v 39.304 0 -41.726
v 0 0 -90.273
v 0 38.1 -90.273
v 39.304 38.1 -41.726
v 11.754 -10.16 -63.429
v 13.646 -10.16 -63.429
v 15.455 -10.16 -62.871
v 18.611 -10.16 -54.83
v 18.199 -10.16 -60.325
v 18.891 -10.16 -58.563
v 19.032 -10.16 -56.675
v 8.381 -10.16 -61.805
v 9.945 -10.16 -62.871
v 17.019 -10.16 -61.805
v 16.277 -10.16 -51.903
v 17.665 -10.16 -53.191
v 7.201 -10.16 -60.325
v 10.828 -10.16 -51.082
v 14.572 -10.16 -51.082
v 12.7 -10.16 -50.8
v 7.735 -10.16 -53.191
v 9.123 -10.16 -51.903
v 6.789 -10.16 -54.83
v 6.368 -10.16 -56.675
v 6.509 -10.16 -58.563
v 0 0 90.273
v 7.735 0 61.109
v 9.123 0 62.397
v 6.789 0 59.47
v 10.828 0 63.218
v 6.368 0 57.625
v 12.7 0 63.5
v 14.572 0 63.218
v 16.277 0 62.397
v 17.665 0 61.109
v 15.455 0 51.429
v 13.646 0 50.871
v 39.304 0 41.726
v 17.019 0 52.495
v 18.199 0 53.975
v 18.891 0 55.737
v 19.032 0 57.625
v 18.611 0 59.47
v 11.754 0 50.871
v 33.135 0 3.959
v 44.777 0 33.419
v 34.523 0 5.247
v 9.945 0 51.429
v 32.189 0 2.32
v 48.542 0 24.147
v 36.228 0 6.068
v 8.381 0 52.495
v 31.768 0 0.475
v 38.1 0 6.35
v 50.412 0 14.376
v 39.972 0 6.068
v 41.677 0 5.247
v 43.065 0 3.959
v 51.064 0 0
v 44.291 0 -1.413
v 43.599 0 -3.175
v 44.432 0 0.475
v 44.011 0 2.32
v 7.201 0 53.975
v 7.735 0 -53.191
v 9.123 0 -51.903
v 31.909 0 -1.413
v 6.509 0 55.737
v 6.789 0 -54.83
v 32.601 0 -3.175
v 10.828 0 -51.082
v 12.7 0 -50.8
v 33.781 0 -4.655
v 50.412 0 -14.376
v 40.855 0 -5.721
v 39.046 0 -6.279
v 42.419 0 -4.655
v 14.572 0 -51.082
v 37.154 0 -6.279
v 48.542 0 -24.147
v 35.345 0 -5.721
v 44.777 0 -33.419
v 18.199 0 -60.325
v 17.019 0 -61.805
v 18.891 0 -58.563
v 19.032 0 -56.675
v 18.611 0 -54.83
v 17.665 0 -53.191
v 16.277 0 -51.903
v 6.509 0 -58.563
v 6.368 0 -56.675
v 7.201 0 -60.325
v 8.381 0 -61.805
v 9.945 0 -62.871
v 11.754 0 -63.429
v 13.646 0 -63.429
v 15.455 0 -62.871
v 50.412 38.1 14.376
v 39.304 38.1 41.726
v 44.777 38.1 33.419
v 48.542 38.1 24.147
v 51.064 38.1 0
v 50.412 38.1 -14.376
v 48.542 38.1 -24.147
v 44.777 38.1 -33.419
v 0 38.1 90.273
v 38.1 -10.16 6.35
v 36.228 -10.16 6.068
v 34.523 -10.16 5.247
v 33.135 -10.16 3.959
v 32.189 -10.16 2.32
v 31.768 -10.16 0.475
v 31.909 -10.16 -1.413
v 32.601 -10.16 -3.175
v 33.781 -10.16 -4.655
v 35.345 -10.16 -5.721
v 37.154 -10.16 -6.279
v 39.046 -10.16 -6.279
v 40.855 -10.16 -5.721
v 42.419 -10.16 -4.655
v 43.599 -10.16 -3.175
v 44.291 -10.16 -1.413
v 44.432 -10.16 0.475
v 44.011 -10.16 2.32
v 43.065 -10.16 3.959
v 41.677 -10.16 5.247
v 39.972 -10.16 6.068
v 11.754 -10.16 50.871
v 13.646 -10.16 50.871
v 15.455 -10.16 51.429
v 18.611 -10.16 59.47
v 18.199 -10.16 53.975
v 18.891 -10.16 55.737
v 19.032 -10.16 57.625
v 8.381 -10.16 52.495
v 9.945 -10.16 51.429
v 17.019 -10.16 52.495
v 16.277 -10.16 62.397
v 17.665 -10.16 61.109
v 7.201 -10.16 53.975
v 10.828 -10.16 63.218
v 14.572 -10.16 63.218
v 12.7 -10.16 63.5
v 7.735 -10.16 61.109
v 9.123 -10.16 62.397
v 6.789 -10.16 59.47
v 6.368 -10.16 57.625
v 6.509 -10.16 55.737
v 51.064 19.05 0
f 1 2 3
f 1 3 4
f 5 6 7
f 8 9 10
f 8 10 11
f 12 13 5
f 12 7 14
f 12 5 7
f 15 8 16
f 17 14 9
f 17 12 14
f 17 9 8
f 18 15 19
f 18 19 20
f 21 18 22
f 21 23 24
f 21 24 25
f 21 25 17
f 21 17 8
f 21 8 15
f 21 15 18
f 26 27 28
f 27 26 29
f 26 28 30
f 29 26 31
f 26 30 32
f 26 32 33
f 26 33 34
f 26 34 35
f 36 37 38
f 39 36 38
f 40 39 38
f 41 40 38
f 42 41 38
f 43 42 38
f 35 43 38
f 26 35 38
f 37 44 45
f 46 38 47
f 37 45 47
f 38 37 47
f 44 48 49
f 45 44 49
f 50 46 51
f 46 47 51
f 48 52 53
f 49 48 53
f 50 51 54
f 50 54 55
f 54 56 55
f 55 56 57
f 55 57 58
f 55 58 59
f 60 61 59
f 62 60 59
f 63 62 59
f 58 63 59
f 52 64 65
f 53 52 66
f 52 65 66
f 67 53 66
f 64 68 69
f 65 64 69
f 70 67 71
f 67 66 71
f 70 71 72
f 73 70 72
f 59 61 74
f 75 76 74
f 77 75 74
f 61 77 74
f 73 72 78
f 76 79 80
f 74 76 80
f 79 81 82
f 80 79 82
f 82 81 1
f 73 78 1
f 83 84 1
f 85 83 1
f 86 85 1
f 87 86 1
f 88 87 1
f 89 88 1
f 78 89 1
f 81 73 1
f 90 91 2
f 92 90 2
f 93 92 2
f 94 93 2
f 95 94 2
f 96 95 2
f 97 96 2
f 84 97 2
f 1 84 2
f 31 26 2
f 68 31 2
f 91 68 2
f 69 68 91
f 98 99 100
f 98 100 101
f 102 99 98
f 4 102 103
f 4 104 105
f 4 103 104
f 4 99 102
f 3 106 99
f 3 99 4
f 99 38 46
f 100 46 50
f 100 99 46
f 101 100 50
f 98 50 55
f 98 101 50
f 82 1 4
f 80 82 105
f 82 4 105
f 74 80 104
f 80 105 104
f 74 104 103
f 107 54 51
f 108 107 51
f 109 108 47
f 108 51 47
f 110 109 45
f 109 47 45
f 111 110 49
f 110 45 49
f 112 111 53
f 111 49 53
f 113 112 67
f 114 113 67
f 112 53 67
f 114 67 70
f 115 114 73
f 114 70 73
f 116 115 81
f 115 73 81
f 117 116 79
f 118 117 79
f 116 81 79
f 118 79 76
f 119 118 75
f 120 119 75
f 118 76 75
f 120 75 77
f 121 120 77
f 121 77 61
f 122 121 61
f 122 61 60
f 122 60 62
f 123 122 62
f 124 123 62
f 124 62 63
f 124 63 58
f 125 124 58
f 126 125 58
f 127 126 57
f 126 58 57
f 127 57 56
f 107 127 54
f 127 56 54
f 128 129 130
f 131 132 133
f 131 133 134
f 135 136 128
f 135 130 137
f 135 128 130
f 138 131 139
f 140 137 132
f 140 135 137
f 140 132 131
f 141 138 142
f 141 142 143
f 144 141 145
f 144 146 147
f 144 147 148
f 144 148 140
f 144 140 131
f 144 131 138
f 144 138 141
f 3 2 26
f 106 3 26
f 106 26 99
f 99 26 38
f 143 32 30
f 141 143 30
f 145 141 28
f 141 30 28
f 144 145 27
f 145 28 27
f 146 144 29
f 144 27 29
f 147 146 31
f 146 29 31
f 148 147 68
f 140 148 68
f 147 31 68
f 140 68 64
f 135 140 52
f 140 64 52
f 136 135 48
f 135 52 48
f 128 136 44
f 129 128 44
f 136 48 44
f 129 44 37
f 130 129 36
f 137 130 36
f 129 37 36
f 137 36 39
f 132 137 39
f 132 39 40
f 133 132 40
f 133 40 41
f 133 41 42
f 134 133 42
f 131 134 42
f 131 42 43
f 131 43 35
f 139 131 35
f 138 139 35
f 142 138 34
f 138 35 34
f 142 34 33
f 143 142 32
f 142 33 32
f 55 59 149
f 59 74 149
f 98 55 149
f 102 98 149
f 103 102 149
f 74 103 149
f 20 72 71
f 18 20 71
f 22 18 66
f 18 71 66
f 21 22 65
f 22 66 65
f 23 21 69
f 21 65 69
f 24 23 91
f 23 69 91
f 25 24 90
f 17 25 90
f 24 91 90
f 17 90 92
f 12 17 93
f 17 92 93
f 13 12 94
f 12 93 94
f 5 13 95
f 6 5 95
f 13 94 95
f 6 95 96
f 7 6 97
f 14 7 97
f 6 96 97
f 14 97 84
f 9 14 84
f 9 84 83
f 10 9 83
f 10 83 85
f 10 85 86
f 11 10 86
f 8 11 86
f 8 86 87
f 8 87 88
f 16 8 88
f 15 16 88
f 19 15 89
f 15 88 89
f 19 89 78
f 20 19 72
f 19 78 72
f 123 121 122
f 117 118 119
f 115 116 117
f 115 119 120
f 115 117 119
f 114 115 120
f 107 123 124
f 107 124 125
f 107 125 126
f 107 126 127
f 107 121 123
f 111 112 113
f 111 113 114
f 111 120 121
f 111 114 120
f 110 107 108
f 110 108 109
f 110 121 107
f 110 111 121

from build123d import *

# Parameters (mm, degrees)
BOSS_EXTRUDE2_DEPTH = 38.1
SKETCH4_R           = 6.35
BOSS_EXTRUDE3_DEPTH = 10.16
CUT_EXTRUDE1_DEPTH  = 72.136
FILLET1_R           = 50.8


with BuildPart() as part:
    # Sketch3 → Boss-Extrude2 (new body)
    with BuildSketch(Plane(origin=(0, 0, 0), x_dir=(1, 0, 0), z_dir=(0, 1, 0))):
        with BuildLine():
            Line((0, 90.272622301), (0, -90.272622301))
            add(Edge.make_bspline(
                [(0, -90.272622301), (51.063722035, -90.272622301), (51.063722035, 0), (51.063722035, 90.272622301), (0, 90.272622301)],
                knots=[3.141592654, 3.141592654, 3.141592654, 4.71238898, 4.71238898, 6.283185307, 6.283185307, 6.283185307], degree=2, weights=[1, 0.707106781, 1, 0.707106781, 1]))
        make_face()
    extrude(amount=BOSS_EXTRUDE2_DEPTH)

    # Sketch4 → Boss-Extrude3 (add)
    with BuildSketch(Plane(origin=(0, 0, 0), x_dir=(-1, 0, 0), z_dir=(0, -1, 0))):
        with Locations(Location((-12.7, -57.15, 0), (0, 0, 270))):
            Circle(SKETCH4_R)
        with Locations(Location((-12.7, 57.15, 0), (0, 0, 270))):
            Circle(SKETCH4_R)
        with Locations(Location((-38.1, 0, 0), (0, 0, 270))):
            Circle(SKETCH4_R)
    extrude(amount=BOSS_EXTRUDE3_DEPTH)

    # Sketch5 → Cut-Extrude1 (cut)
    with BuildSketch(Plane(origin=(0, 0, 0), x_dir=(-1, 0, 0), z_dir=(0, -1, 0))):
        Polygon((0, -90.272622301), (-47.948224184, -31.049250245), (-73.055798017, -65.580157533), (-28.861670947, -122.242067224), align=None)
        Polygon((0, 90.272622301), (-47.948224184, 31.049250245), (-64.283944167, 60.660936273), (-1.502105519, 110.713212963), align=None)
    extrude(amount=-CUT_EXTRUDE1_DEPTH, mode=Mode.SUBTRACT)

    # Fillet1
    fillet1_edges = [part.edges().sort_by_distance(p)[0] for p in [
        (47.948224184, 19.05, -31.049250245),
        (47.948224184, 19.05, 31.049250245),
    ]]
    fillet(fillet1_edges, radius=FILLET1_R)


solid = part.part
